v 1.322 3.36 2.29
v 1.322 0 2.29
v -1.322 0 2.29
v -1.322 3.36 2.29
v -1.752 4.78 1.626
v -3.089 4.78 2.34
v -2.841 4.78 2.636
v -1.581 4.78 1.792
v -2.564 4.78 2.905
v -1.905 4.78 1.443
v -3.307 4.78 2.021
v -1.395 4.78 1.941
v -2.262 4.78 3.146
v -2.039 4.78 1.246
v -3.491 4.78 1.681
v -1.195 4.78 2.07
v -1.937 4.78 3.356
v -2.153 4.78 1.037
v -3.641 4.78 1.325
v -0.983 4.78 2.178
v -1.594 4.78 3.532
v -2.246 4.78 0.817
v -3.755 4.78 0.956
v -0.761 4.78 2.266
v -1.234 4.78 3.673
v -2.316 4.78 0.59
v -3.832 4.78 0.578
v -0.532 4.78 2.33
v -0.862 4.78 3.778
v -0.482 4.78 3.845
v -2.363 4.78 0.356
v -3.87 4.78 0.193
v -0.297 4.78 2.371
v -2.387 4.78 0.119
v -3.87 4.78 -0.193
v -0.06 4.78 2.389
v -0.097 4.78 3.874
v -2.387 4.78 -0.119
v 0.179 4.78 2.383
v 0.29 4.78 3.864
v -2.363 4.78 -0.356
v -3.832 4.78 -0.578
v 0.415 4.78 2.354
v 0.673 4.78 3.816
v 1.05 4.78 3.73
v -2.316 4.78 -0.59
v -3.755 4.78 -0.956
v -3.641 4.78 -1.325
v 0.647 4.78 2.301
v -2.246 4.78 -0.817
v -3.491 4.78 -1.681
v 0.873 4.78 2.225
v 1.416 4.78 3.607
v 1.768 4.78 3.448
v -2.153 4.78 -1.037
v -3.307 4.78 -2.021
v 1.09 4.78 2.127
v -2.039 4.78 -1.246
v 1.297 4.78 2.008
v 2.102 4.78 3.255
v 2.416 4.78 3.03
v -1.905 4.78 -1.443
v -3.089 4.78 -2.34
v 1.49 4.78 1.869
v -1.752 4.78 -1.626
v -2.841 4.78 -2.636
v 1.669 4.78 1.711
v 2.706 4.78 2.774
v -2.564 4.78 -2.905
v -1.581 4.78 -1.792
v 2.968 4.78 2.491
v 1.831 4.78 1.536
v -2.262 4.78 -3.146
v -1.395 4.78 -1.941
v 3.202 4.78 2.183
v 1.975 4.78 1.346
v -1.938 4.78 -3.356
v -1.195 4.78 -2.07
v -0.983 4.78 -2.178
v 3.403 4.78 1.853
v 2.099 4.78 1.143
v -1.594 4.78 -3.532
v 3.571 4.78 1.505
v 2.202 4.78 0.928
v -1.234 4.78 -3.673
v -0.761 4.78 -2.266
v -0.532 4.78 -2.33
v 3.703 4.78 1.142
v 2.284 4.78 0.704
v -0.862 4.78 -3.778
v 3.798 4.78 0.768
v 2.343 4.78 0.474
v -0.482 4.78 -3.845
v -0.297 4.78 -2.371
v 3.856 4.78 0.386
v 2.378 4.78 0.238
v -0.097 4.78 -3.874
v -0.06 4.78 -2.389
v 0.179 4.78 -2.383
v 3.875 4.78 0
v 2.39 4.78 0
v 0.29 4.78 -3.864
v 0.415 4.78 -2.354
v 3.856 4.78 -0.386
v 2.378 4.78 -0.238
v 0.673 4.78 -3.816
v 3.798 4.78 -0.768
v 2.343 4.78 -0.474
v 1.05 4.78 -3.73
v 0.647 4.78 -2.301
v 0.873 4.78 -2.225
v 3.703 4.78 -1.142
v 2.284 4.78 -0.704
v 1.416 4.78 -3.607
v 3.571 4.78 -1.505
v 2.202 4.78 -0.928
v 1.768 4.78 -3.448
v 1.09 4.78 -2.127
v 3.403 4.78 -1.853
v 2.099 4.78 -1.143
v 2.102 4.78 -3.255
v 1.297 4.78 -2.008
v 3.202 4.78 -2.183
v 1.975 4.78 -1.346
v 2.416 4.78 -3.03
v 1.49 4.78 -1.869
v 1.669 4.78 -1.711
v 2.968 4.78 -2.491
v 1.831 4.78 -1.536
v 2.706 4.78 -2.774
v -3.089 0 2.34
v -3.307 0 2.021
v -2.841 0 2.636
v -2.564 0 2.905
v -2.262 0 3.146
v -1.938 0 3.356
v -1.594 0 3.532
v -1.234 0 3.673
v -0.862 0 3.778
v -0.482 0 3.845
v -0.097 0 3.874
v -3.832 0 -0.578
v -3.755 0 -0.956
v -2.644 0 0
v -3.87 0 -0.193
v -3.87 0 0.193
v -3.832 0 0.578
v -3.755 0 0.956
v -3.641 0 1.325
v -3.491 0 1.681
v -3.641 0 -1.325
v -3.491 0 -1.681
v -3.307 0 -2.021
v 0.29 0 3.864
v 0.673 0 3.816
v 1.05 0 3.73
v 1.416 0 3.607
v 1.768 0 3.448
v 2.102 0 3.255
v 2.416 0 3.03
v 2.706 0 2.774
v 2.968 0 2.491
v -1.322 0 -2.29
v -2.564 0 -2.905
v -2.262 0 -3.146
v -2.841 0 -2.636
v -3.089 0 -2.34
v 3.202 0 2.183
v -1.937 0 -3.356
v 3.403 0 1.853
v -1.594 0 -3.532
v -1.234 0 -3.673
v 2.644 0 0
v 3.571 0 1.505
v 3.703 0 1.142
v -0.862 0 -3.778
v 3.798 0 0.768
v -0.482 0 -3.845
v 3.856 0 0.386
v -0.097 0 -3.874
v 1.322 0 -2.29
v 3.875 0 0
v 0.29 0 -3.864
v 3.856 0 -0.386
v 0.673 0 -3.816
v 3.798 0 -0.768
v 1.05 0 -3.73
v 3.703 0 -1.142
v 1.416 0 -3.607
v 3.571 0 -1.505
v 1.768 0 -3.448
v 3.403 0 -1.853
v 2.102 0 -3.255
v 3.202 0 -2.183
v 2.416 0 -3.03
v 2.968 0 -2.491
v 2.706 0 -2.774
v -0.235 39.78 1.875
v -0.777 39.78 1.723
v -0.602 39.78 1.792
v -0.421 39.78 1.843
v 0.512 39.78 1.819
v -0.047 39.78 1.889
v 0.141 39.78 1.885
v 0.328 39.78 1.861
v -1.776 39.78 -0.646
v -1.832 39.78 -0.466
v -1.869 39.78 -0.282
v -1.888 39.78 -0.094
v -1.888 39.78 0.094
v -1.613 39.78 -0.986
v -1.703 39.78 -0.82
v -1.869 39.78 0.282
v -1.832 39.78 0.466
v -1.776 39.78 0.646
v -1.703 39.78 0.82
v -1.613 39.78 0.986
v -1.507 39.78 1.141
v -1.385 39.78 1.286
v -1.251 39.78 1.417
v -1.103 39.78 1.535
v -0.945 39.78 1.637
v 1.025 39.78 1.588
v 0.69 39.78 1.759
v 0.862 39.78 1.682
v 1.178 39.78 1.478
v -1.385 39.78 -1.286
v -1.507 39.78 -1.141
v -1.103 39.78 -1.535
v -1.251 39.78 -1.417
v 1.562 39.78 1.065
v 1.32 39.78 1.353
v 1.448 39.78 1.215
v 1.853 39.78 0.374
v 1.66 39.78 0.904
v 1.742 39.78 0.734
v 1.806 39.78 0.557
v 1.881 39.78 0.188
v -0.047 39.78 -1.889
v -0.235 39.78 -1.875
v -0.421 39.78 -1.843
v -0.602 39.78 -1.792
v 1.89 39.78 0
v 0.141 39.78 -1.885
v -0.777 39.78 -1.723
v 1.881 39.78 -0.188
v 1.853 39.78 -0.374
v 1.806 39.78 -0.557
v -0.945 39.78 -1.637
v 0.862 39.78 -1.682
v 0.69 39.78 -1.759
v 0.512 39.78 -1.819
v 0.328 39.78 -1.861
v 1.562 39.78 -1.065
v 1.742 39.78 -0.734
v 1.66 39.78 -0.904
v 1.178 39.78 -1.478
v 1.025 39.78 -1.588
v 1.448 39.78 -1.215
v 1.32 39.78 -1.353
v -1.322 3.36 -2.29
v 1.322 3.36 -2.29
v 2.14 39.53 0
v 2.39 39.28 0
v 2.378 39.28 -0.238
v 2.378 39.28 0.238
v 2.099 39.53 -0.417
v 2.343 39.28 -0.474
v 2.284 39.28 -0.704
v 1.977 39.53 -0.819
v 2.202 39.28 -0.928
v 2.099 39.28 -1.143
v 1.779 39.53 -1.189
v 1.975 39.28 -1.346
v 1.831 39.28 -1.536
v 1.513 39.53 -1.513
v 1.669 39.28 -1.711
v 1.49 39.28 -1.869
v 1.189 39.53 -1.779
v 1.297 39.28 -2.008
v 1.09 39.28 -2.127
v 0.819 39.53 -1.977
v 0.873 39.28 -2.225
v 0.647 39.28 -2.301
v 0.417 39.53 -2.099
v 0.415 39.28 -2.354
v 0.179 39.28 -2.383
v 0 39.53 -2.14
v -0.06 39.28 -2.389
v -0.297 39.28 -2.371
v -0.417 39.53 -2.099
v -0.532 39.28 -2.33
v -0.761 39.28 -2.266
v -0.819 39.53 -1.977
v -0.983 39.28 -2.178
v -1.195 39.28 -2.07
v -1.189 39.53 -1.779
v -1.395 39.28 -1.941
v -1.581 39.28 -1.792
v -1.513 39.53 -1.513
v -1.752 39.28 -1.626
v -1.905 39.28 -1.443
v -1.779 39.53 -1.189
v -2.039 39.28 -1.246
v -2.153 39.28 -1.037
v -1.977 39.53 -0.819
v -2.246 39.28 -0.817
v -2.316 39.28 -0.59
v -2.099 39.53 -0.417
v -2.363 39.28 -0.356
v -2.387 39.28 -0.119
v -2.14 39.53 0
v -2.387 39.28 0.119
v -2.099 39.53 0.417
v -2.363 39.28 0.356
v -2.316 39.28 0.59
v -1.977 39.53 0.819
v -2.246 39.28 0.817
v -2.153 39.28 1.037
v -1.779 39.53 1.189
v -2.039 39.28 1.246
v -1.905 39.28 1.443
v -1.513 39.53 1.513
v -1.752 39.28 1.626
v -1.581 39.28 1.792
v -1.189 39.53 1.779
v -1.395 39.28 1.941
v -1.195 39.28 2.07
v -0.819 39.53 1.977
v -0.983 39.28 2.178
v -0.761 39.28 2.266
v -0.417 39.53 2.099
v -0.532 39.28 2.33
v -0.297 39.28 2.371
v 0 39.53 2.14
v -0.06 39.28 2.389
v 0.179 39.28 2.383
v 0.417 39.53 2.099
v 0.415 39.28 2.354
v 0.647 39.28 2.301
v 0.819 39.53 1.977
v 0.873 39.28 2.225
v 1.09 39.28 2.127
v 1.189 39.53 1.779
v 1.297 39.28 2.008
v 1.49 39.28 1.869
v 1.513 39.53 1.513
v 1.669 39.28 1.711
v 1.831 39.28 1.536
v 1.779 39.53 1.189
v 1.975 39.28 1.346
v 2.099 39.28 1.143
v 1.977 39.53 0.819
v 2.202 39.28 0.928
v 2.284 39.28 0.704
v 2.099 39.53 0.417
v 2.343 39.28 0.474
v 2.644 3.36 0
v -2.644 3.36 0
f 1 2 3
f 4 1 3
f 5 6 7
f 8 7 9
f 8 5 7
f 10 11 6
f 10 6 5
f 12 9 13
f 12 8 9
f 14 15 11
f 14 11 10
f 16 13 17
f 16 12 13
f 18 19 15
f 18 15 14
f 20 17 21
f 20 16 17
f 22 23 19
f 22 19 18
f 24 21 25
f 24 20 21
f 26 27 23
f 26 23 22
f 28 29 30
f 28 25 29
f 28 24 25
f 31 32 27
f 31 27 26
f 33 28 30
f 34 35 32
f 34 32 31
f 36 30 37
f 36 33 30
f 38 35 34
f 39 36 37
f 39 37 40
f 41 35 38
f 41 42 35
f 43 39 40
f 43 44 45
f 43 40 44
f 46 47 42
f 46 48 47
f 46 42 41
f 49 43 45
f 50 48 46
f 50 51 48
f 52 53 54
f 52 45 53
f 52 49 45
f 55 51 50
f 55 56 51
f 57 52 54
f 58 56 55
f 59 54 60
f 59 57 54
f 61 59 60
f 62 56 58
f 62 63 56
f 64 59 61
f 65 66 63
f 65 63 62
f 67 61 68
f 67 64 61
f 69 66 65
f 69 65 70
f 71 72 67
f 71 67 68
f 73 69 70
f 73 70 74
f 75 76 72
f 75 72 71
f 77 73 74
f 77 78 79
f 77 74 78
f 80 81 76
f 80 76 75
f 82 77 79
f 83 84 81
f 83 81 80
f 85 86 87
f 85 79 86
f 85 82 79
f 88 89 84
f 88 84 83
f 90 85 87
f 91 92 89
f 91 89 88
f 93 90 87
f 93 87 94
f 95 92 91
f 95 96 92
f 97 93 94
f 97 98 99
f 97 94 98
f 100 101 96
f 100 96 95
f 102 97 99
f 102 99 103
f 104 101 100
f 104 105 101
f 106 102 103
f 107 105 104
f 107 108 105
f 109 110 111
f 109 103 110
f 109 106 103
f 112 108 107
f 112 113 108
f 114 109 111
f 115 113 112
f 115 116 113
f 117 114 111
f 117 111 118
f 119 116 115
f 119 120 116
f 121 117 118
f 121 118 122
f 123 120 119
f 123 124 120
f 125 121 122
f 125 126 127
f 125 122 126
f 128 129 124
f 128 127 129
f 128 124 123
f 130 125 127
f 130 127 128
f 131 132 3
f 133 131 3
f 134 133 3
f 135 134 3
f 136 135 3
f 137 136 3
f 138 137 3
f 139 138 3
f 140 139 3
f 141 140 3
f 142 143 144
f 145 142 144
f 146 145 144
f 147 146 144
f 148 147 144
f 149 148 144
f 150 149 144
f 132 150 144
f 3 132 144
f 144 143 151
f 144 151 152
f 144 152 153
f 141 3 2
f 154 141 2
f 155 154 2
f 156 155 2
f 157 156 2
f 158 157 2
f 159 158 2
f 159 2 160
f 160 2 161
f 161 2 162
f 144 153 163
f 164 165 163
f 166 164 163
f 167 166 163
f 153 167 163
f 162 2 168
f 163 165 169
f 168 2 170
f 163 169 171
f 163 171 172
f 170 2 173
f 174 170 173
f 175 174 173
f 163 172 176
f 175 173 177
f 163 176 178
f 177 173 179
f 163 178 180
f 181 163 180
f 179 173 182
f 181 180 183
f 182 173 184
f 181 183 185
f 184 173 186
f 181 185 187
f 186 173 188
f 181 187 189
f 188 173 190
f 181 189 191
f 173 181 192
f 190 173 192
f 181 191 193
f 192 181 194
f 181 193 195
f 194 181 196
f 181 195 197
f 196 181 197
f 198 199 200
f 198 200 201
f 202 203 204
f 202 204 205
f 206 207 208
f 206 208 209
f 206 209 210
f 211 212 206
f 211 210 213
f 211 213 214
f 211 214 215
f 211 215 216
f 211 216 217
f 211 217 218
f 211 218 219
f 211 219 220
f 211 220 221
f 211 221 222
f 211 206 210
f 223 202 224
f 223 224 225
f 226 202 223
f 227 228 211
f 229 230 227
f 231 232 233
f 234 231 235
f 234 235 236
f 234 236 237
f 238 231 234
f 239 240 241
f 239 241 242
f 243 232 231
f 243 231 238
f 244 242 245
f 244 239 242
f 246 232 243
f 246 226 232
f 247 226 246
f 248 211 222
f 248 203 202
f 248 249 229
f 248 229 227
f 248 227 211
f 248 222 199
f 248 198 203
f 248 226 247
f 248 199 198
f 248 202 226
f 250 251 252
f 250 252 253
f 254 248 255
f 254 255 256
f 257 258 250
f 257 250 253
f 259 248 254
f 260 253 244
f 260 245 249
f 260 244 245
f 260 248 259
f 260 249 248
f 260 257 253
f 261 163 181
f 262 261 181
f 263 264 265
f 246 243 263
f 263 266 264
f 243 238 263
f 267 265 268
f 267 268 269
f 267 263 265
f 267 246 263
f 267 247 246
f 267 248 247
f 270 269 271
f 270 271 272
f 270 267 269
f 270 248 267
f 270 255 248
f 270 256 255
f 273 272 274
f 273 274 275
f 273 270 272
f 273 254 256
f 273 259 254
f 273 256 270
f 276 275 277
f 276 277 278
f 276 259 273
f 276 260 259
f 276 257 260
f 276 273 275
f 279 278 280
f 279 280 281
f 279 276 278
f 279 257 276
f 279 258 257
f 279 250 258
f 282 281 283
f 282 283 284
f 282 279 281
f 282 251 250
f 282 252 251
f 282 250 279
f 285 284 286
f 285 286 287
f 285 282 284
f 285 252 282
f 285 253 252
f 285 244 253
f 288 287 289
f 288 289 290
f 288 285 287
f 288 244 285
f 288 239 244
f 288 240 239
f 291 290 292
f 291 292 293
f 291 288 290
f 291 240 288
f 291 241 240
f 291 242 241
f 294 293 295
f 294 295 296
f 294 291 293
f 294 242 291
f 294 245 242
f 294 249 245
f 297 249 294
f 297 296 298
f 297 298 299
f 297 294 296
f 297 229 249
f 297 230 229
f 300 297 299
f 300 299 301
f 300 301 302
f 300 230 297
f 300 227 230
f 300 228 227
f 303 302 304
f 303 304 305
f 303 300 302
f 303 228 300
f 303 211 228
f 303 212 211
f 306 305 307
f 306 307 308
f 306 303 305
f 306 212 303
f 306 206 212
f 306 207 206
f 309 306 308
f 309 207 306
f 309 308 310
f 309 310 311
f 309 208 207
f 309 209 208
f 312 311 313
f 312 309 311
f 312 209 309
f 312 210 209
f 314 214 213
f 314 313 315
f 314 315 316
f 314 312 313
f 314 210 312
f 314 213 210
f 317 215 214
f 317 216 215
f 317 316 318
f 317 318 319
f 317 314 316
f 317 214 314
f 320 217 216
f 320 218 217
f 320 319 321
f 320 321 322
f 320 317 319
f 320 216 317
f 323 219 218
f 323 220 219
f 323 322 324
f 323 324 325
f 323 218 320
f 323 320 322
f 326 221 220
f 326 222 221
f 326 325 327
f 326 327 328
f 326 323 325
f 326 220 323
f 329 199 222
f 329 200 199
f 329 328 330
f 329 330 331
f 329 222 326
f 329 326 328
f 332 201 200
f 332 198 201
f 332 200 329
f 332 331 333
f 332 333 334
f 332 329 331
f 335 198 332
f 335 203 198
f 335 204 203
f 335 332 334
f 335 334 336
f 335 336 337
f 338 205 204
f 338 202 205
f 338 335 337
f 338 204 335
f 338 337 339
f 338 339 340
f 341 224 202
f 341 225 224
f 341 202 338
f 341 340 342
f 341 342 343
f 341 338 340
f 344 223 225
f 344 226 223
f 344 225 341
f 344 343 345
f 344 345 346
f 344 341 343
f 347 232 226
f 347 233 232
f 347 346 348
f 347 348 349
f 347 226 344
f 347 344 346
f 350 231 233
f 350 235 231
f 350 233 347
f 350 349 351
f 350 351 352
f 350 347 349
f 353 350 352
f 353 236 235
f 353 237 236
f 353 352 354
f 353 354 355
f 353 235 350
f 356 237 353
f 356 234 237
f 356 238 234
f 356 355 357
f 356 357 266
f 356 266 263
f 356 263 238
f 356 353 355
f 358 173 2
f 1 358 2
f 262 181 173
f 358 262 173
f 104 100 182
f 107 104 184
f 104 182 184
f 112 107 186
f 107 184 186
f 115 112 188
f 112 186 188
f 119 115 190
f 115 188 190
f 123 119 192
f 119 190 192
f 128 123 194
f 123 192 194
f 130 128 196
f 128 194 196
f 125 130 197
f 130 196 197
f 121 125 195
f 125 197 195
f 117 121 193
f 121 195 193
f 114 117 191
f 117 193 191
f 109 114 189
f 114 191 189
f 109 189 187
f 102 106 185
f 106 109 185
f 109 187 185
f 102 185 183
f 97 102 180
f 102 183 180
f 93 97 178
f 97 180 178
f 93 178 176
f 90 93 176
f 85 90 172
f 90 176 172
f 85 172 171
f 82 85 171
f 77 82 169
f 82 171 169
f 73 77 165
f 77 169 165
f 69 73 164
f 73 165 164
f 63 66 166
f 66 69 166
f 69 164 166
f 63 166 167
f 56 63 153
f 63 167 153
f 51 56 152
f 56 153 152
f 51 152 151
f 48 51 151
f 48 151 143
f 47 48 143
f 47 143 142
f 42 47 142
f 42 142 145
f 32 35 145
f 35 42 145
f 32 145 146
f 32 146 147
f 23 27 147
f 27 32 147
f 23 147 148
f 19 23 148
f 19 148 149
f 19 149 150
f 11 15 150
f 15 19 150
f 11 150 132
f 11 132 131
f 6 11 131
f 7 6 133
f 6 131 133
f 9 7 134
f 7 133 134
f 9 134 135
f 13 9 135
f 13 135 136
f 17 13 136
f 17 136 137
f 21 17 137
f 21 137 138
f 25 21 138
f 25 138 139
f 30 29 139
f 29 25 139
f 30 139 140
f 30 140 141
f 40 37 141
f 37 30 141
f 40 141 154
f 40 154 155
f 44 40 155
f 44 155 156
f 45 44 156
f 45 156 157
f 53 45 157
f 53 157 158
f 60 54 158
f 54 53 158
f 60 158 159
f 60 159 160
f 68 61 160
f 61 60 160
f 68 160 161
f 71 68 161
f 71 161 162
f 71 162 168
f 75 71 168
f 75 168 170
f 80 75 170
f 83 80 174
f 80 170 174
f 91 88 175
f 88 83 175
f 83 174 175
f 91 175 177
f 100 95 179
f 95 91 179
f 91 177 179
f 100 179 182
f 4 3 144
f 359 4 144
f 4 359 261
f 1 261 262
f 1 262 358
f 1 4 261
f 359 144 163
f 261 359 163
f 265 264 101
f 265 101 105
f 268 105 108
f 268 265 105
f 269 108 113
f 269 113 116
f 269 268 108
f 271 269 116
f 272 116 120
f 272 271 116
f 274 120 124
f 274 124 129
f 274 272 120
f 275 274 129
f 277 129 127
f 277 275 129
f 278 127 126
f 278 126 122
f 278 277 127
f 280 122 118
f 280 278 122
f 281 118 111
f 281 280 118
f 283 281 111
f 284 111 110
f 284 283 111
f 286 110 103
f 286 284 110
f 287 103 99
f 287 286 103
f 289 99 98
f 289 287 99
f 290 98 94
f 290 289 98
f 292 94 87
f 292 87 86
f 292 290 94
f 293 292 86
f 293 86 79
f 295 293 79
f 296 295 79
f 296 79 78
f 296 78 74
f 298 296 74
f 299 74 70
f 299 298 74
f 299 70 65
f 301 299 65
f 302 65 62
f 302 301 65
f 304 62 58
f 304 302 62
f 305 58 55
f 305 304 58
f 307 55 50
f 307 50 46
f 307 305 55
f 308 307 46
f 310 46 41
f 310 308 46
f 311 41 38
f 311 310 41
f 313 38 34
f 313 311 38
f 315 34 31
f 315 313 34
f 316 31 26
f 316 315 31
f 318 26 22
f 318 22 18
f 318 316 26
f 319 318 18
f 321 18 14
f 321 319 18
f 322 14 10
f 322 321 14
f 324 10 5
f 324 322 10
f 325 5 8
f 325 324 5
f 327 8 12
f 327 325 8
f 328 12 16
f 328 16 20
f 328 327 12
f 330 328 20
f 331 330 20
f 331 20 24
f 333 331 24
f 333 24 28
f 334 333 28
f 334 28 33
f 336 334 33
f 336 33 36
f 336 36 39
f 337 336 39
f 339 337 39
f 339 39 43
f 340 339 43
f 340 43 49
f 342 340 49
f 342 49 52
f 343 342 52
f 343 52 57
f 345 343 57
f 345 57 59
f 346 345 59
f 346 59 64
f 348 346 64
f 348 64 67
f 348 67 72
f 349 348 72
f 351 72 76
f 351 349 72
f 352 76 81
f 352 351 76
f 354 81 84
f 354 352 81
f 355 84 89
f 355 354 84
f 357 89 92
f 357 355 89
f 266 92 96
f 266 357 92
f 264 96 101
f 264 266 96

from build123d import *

# Parameters (mm, degrees)
SKETCH1_R           = 3.875
BOSS_EXTRUDE1_DEPTH = 39.78
SKETCH2_OUTSIDE_W   = 18.002
SKETCH2_OUTSIDE_H   = 18.002
SKETCH2_OUTSIDE_R   = 2.39
CUT_EXTRUDE1_DEPTH  = 35
CHAMFER1_SIZE       = 0.5
CUT_EXTRUDE2_DEPTH  = 3.36


with BuildPart() as part:
    # Sketch1 → Boss-Extrude1 (new body)
    with BuildSketch(Plane(origin=(0, 0, 0), x_dir=(1, 0, 0), z_dir=(0, 1, 0))):
        Circle(SKETCH1_R)
    extrude(amount=BOSS_EXTRUDE1_DEPTH)

    # Sketch2 outside → Cut-Extrude1 (cut)
    with BuildSketch(Plane(origin=(0, 39.78, 0), x_dir=(1, 0, 0), z_dir=(0, 1, 0))):
        Rectangle(SKETCH2_OUTSIDE_W, SKETCH2_OUTSIDE_H)
        Circle(SKETCH2_OUTSIDE_R, mode=Mode.SUBTRACT)
    extrude(amount=-CUT_EXTRUDE1_DEPTH, mode=Mode.SUBTRACT)

    # Chamfer1
    chamfer1_edges = [part.edges().sort_by_distance(p)[0] for p in [
        (-2.39, 39.78, 0),
    ]]
    chamfer(chamfer1_edges, length=CHAMFER1_SIZE)

    # Sketch8 → Cut-Extrude2 (cut)
    with BuildSketch(Plane.XZ):
        Polygon((2.644264233, 0), (1.322132116, 2.29), (-1.322132116, 2.29), (-2.644264233, 0), (-1.322132116, -2.29), (1.322132116, -2.29), align=None)
    extrude(amount=-CUT_EXTRUDE2_DEPTH, mode=Mode.SUBTRACT)


solid = part.part
